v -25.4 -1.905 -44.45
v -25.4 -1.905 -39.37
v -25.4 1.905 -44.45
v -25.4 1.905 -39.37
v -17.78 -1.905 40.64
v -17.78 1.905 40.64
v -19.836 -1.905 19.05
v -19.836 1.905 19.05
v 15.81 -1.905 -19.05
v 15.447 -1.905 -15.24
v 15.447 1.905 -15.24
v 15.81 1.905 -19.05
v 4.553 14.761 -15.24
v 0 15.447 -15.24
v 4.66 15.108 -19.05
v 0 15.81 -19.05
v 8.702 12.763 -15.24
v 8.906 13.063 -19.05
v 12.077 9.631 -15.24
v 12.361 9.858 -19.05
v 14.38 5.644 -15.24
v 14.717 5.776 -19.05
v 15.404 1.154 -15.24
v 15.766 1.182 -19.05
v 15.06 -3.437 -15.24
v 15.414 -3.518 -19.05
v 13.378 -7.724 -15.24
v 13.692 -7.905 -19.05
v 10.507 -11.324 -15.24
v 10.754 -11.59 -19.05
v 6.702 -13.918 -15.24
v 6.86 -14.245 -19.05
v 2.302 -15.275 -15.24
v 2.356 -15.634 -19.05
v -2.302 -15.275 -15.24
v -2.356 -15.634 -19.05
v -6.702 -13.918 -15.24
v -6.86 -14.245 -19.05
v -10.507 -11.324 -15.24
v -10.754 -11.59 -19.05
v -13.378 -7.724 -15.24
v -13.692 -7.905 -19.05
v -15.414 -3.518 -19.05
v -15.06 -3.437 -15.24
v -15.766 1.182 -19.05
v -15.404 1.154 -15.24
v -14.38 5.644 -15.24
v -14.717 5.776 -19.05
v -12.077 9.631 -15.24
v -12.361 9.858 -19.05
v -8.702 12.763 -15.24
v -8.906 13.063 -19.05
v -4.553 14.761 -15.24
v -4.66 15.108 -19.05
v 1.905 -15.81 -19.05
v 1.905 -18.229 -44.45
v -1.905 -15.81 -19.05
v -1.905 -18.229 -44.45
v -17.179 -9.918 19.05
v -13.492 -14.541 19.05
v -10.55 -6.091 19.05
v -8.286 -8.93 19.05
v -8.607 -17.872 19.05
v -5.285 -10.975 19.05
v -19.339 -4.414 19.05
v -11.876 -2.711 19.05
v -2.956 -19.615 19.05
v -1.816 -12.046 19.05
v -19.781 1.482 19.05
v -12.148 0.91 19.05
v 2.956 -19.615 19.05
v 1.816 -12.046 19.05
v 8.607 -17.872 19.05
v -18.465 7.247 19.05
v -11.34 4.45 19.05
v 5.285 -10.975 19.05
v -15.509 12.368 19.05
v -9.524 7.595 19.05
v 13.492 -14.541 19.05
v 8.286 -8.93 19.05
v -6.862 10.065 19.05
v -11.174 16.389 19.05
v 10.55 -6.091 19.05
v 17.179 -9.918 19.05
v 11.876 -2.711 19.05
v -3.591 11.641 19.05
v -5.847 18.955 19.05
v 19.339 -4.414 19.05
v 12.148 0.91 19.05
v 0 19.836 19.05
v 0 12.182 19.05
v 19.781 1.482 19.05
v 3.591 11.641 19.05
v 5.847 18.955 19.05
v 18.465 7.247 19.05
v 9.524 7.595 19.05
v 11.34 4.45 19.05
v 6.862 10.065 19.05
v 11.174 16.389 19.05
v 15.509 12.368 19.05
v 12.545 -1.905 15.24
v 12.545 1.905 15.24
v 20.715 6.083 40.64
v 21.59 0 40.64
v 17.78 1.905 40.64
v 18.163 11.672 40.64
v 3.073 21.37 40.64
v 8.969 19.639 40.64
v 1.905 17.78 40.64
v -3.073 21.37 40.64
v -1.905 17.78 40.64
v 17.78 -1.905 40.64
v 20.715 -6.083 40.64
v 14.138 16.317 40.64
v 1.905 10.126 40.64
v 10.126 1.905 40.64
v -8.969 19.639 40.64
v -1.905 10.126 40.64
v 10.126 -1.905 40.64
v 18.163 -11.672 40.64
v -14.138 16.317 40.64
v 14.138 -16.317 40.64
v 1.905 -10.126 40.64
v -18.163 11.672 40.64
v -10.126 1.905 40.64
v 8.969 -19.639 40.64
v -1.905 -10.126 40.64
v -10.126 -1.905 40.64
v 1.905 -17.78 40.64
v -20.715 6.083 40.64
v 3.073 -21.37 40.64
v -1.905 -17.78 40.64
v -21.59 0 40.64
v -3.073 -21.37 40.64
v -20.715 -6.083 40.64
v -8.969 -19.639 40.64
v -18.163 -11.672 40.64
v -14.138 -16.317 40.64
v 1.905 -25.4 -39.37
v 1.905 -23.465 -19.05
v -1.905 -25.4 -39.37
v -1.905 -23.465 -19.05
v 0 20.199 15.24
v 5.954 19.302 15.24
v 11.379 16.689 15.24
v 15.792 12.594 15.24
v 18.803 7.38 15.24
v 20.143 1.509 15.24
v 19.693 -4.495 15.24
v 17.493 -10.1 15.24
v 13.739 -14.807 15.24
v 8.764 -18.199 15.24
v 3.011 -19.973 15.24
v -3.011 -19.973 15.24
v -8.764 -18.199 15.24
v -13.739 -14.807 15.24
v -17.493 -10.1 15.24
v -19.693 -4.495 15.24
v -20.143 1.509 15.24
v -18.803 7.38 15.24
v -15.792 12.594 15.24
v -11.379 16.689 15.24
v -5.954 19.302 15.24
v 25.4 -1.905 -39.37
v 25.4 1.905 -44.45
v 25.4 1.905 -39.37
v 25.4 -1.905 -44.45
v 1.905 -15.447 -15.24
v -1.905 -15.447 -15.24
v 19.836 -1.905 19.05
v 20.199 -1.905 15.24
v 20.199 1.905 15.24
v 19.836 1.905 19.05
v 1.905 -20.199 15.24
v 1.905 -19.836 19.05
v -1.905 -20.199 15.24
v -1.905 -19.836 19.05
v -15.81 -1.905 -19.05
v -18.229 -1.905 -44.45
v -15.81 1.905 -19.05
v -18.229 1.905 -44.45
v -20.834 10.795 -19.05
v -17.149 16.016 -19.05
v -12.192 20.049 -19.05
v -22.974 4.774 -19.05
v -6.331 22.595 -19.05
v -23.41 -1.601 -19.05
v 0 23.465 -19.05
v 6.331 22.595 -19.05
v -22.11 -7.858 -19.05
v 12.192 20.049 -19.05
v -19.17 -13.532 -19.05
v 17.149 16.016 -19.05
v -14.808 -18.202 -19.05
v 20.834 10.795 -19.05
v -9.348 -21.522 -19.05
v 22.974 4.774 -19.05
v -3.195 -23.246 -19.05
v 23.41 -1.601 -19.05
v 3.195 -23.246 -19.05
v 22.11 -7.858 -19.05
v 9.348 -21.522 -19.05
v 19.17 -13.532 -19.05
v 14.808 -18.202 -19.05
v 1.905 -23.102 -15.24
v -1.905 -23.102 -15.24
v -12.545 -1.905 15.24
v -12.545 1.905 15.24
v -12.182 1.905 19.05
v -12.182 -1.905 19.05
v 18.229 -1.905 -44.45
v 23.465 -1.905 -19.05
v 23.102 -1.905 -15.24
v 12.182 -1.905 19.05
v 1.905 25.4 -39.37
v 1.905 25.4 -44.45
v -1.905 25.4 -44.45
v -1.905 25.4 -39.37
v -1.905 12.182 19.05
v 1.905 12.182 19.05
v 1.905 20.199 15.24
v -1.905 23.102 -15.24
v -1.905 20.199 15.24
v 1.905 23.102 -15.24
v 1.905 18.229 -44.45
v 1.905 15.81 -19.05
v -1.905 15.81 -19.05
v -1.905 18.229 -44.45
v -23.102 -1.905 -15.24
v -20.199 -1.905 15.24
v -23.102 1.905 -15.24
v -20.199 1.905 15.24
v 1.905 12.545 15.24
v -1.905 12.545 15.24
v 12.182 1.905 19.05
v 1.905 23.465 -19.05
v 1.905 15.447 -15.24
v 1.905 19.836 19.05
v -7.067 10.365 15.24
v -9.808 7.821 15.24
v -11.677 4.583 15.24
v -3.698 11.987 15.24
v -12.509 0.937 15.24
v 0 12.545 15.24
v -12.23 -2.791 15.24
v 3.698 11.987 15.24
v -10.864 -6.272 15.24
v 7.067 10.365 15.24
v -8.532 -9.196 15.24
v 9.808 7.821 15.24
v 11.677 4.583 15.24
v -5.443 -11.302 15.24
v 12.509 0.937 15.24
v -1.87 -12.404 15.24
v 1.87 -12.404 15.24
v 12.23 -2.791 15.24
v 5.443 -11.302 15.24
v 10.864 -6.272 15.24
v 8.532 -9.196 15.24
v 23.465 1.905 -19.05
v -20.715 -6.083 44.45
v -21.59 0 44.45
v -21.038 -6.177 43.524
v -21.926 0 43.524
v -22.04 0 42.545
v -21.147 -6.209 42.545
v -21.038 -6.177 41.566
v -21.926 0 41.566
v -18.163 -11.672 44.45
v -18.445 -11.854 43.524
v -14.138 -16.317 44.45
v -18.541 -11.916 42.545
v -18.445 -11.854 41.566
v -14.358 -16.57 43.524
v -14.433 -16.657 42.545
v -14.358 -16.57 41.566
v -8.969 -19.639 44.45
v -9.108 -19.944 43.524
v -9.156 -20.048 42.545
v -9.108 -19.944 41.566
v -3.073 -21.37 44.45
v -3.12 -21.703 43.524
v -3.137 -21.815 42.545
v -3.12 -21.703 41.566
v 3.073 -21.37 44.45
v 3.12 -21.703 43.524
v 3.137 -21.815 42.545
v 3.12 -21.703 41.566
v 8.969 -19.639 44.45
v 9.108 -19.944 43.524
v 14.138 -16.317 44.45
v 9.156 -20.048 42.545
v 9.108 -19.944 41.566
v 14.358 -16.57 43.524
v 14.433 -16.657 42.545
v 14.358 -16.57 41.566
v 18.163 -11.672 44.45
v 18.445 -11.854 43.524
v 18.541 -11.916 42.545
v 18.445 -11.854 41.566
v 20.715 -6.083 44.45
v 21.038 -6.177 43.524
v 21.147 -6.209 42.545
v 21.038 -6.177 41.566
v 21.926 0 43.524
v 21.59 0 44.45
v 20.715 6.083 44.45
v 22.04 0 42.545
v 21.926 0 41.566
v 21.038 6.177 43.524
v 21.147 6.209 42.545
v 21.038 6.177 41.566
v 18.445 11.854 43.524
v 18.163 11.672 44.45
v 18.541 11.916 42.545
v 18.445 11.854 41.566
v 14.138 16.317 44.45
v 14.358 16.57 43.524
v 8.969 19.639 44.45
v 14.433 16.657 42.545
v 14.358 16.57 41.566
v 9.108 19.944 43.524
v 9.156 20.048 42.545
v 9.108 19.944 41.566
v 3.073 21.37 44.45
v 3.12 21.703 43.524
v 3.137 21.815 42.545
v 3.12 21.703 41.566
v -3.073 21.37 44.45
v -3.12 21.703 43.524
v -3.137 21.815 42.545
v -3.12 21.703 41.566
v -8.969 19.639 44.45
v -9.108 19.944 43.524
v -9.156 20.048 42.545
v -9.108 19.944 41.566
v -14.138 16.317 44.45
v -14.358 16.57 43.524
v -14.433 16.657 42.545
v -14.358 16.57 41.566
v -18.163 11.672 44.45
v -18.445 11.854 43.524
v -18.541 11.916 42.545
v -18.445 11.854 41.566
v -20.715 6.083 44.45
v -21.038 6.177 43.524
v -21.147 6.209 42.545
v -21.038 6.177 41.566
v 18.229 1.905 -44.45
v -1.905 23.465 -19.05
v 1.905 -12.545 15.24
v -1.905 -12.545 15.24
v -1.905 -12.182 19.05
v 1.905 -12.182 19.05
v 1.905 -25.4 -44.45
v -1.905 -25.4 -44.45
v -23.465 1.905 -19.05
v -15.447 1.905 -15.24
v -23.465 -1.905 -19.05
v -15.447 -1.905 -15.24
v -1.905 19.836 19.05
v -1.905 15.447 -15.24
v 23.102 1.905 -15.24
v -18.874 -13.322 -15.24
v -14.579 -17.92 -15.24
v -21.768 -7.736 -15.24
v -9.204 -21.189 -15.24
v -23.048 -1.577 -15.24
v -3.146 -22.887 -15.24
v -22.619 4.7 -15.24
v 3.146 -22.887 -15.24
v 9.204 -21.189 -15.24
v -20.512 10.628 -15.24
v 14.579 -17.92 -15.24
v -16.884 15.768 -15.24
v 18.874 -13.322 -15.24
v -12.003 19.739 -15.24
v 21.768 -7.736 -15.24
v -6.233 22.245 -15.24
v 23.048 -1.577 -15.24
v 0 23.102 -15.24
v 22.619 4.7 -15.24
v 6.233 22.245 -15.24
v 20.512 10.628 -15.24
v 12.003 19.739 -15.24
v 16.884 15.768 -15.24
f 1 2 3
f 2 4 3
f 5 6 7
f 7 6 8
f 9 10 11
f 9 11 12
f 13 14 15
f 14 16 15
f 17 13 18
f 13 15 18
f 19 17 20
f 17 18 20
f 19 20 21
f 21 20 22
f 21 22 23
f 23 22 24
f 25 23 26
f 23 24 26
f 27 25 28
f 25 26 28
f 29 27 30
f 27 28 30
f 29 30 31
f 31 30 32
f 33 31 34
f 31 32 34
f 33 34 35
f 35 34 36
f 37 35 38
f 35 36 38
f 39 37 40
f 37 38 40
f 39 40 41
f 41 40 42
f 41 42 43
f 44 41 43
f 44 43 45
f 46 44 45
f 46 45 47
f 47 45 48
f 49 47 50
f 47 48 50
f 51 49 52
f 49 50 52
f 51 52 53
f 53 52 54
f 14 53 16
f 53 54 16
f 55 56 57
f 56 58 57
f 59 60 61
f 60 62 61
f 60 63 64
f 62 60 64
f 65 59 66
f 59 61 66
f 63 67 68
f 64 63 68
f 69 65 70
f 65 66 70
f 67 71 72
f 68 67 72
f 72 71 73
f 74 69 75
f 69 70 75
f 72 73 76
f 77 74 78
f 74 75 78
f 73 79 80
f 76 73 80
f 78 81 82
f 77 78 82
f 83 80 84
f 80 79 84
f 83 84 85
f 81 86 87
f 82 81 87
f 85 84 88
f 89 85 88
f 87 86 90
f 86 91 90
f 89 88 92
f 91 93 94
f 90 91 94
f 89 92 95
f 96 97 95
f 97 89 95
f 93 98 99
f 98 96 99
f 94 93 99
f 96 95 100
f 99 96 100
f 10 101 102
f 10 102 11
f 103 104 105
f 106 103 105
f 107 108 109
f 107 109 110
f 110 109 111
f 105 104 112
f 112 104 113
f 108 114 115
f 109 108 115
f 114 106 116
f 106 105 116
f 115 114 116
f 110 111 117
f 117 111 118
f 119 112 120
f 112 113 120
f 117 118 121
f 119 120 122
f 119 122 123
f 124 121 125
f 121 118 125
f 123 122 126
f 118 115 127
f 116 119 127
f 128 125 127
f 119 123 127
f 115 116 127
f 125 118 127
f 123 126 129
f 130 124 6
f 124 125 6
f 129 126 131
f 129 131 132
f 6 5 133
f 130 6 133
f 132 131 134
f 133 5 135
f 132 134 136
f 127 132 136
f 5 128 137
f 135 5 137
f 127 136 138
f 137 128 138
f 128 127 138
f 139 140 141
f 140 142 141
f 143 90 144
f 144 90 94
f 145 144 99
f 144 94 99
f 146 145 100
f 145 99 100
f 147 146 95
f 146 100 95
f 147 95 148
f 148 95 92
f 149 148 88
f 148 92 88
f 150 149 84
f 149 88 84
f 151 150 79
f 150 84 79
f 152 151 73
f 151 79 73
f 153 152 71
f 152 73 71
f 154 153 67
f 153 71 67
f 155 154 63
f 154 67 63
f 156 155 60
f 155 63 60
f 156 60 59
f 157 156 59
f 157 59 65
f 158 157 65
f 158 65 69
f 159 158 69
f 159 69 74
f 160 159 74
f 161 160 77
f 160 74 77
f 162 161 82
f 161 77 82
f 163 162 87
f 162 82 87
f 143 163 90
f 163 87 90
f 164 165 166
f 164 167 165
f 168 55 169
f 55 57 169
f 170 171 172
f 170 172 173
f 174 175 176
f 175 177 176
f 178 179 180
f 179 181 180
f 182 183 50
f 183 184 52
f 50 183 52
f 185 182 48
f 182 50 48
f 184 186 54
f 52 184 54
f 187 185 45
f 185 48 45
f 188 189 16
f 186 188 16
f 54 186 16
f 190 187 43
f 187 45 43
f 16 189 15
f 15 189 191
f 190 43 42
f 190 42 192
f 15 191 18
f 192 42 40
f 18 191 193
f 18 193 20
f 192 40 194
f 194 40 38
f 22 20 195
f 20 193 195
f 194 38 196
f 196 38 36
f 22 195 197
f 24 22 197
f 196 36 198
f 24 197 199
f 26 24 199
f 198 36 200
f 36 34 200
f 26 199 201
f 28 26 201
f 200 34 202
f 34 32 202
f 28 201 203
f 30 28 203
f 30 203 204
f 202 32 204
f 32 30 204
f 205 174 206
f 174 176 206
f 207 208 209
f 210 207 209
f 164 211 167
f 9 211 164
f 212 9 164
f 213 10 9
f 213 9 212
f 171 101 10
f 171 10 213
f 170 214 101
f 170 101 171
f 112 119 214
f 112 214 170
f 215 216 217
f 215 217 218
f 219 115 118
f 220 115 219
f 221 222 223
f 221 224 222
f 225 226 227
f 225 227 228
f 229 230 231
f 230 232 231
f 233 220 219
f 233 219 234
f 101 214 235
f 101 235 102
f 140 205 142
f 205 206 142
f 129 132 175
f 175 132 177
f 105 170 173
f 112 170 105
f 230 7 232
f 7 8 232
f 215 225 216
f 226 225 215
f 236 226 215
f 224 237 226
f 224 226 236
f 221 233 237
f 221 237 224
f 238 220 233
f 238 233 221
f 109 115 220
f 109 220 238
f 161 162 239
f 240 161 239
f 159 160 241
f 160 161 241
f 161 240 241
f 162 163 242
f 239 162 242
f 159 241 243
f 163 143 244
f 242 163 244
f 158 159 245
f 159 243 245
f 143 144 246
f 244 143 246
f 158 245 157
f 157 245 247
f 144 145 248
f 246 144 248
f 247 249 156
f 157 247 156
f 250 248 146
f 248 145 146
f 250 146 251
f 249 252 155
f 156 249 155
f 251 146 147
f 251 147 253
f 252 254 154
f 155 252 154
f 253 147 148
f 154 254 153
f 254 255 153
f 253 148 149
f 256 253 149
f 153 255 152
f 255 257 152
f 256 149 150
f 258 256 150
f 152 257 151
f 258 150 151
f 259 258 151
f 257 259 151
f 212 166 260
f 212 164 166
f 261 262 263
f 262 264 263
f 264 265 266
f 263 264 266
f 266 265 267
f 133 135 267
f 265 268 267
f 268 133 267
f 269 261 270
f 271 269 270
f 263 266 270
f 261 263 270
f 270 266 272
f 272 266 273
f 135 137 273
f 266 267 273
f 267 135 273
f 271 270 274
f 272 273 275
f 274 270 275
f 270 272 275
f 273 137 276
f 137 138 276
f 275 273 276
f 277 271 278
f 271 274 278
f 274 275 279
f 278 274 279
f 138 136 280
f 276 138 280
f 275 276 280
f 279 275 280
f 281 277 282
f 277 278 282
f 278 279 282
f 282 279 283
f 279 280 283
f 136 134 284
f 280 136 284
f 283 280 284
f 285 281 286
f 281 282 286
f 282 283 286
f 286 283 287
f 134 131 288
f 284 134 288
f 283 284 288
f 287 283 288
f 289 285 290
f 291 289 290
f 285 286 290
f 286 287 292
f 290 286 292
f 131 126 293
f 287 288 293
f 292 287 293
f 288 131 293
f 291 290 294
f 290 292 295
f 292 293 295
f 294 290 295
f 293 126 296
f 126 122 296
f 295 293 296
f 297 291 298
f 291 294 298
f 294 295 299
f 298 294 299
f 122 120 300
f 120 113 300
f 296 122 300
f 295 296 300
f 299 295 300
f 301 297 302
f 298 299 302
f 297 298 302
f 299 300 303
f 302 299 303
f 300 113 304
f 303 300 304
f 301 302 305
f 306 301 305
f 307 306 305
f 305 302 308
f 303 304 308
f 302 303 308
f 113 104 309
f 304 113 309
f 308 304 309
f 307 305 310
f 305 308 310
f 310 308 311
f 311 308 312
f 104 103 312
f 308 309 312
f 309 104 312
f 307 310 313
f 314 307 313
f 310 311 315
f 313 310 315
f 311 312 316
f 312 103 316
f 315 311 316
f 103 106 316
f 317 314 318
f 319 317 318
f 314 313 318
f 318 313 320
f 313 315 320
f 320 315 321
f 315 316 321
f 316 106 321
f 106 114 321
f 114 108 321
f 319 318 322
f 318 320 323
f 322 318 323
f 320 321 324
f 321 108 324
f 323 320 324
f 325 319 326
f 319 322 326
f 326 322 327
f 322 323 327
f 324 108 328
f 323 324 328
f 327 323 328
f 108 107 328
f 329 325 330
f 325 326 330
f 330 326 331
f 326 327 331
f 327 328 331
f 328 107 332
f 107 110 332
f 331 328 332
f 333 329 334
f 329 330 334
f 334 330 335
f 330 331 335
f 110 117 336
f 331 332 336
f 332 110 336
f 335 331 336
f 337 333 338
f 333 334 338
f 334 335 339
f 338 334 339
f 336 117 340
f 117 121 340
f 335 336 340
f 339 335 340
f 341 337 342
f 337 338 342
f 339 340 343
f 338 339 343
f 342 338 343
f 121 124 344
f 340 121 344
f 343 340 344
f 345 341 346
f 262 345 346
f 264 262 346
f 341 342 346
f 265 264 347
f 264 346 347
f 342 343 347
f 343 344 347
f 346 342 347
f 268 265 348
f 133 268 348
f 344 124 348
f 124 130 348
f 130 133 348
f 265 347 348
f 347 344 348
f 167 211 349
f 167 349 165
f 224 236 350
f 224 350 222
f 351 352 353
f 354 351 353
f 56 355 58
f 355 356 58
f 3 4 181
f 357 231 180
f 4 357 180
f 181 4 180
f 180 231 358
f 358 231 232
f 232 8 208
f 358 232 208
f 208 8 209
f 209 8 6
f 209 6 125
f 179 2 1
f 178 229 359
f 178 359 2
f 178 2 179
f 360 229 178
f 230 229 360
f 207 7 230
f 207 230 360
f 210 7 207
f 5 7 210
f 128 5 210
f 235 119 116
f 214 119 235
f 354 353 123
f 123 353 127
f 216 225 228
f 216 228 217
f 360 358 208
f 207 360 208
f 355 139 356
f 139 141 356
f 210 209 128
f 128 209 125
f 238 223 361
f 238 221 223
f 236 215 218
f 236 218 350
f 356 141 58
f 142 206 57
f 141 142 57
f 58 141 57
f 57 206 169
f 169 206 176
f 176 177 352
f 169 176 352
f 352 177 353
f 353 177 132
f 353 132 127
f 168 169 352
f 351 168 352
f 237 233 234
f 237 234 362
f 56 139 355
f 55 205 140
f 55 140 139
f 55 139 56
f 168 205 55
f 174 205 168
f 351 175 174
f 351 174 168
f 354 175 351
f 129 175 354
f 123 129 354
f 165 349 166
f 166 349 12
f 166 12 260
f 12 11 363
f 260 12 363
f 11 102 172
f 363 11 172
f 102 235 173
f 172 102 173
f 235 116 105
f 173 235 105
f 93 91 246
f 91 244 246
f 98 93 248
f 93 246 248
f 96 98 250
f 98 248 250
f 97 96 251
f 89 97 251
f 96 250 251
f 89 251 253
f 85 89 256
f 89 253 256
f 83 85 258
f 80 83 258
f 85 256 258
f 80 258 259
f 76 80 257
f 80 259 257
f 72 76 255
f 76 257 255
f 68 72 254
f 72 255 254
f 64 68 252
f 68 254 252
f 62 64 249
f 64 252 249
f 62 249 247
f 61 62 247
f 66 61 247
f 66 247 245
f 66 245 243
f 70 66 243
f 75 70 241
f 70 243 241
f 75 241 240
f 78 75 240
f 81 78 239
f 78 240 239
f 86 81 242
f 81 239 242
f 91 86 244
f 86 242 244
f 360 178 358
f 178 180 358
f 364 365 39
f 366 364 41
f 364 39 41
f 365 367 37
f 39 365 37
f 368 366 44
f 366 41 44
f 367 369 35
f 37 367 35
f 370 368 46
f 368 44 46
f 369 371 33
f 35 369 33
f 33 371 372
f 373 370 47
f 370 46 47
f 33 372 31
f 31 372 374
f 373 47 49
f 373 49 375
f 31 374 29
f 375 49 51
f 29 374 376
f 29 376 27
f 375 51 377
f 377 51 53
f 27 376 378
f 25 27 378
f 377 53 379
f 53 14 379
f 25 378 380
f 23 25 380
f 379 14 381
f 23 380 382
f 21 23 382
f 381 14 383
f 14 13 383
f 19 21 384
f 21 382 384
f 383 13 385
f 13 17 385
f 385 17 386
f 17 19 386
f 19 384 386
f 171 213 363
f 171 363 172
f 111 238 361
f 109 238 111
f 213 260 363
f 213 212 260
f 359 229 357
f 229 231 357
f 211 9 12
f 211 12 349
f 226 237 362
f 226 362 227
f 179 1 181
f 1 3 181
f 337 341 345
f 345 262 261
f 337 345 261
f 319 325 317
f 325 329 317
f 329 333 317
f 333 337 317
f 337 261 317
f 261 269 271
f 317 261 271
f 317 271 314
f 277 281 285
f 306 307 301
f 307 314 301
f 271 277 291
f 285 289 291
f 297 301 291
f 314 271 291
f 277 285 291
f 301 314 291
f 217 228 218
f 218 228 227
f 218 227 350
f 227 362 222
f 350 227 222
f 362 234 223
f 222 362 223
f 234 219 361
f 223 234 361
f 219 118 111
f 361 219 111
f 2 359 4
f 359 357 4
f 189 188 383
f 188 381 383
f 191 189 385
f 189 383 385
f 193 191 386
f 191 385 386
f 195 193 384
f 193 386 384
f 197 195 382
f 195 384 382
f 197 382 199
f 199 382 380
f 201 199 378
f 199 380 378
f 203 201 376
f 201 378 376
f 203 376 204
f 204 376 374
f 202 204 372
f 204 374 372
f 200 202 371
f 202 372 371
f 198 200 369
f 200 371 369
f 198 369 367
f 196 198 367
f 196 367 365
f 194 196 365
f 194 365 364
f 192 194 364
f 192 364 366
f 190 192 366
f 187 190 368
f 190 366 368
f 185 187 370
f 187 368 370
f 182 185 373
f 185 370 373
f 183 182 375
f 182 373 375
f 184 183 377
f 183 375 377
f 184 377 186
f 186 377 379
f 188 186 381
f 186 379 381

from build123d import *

# Parameters (mm, degrees)
F2_DEPTH = 1.905
F4_DEPTH = 1.905


with BuildPart() as f1:
    # F0 (on Front) → F1 (revolve)
    with BuildSketch(Plane.XZ):
        with BuildLine():
            Line((0, 40.64), (0, 44.45))
            Line((0, 44.45), (-21.59, 44.45))
            ThreePointArc((-21.59, 44.45), (-22.0397094971, 42.545), (-21.59, 40.64))
            Line((-21.59, 40.64), (-17.78, 40.64))
            Line((-17.78, 40.64), (-10.1255201859, 40.64))
            Line((-10.1255201859, 40.64), (0, 40.64))
        make_face()
    revolve(axis=Axis((0, 0, 42.545), (0, 0, 1)))

    # F0 (on Front) → F2 (join, symmetric)
    with BuildSketch(Plane.XZ):
        Polygon((-12.1817106621, 19.05), (-10.1255201859, 40.64), (-17.78, 40.64), (-19.8361904762, 19.05), align=None)
        Polygon((-12.5445678049, 15.24), (-12.1817106621, 19.05), (-19.8361904762, 19.05), (-20.199047619, 15.24), align=None)
        Polygon((-15.4474249478, -15.24), (-12.5445678049, 15.24), (-20.199047619, 15.24), (-23.1019047619, -15.24), align=None)
        Polygon((-23.4647619048, -19.05), (-15.8102820907, -19.05), (-15.4474249478, -15.24), (-23.1019047619, -15.24), align=None)
        Polygon((-25.4, -44.45), (-18.2293297097, -44.45), (-17.7455201859, -39.37), (-15.8102820907, -19.05), (-23.4647619048, -19.05), (-25.4, -39.37), align=None)
        Polygon((15.8102820907, -19.05), (23.4647619048, -19.05), (23.1019047619, -15.24), (15.4474249478, -15.24), align=None)
        Polygon((25.4, -44.45), (25.4, -39.37), (23.4647619048, -19.05), (15.8102820907, -19.05), (17.7455201859, -39.37), (18.2293297097, -44.45), align=None)
        Polygon((15.4474249478, -15.24), (23.1019047619, -15.24), (20.199047619, 15.24), (12.5445678049, 15.24), align=None)
        Polygon((20.199047619, 15.24), (19.8361904762, 19.05), (12.1817106621, 19.05), (12.5445678049, 15.24), align=None)
        Polygon((19.8361904762, 19.05), (17.78, 40.64), (10.1255201859, 40.64), (12.1817106621, 19.05), align=None)
    extrude(amount=F2_DEPTH, both=True)

    # F3 (on Right) → F4 (join, symmetric)
    with BuildSketch(Plane.YZ):
        Polygon((-12.1817106621, 19.05), (-10.1255201859, 40.64), (-17.78, 40.64), (-19.8361904762, 19.05), align=None)
        Polygon((-12.5445678049, 15.24), (-12.1817106621, 19.05), (-19.8361904762, 19.05), (-20.199047619, 15.24), align=None)
        Polygon((19.8361904762, 19.05), (17.78, 40.64), (10.1255201859, 40.64), (12.1817106621, 19.05), align=None)
        Polygon((20.199047619, 15.24), (19.8361904762, 19.05), (12.1817106621, 19.05), (12.5445678049, 15.24), align=None)
        Polygon((15.4474249478, -15.24), (23.1019047619, -15.24), (20.199047619, 15.24), (12.5445678049, 15.24), align=None)
        Polygon((-15.4474249478, -15.24), (-12.5445678049, 15.24), (-20.199047619, 15.24), (-23.1019047619, -15.24), align=None)
        Polygon((-23.4647619048, -19.05), (-15.8102820907, -19.05), (-15.4474249478, -15.24), (-23.1019047619, -15.24), align=None)
        Polygon((-25.4, -44.45), (-18.2293297097, -44.45), (-17.7455201859, -39.37), (-15.8102820907, -19.05), (-23.4647619048, -19.05), (-25.4, -39.37), align=None)
        Polygon((25.4, -44.45), (25.4, -39.37), (23.4647619048, -19.05), (15.8102820907, -19.05), (17.7455201859, -39.37), (18.2293297097, -44.45), align=None)
        Polygon((15.8102820907, -19.05), (23.4647619048, -19.05), (23.1019047619, -15.24), (15.4474249478, -15.24), align=None)
    extrude(amount=F4_DEPTH, both=True)


with BuildPart() as f5:
    # F3 (on Right) → F5 (revolve)
    with BuildSketch(Plane.YZ):
        Polygon((20.199047619, 15.24), (19.8361904762, 19.05), (12.1817106621, 19.05), (12.5445678049, 15.24), align=None)
    revolve(axis=Axis((0, 0, 4.0361245537), (0, 0, -1)))


with BuildPart() as f6:
    # F3 (on Right) → F6 (revolve)
    with BuildSketch(Plane.YZ):
        Polygon((15.8102820907, -19.05), (23.4647619048, -19.05), (23.1019047619, -15.24), (15.4474249478, -15.24), align=None)
    revolve(axis=Axis((0, 0, 4.0361245537), (0, 0, -1)))


solid = Compound([f1.part, f5.part, f6.part])
